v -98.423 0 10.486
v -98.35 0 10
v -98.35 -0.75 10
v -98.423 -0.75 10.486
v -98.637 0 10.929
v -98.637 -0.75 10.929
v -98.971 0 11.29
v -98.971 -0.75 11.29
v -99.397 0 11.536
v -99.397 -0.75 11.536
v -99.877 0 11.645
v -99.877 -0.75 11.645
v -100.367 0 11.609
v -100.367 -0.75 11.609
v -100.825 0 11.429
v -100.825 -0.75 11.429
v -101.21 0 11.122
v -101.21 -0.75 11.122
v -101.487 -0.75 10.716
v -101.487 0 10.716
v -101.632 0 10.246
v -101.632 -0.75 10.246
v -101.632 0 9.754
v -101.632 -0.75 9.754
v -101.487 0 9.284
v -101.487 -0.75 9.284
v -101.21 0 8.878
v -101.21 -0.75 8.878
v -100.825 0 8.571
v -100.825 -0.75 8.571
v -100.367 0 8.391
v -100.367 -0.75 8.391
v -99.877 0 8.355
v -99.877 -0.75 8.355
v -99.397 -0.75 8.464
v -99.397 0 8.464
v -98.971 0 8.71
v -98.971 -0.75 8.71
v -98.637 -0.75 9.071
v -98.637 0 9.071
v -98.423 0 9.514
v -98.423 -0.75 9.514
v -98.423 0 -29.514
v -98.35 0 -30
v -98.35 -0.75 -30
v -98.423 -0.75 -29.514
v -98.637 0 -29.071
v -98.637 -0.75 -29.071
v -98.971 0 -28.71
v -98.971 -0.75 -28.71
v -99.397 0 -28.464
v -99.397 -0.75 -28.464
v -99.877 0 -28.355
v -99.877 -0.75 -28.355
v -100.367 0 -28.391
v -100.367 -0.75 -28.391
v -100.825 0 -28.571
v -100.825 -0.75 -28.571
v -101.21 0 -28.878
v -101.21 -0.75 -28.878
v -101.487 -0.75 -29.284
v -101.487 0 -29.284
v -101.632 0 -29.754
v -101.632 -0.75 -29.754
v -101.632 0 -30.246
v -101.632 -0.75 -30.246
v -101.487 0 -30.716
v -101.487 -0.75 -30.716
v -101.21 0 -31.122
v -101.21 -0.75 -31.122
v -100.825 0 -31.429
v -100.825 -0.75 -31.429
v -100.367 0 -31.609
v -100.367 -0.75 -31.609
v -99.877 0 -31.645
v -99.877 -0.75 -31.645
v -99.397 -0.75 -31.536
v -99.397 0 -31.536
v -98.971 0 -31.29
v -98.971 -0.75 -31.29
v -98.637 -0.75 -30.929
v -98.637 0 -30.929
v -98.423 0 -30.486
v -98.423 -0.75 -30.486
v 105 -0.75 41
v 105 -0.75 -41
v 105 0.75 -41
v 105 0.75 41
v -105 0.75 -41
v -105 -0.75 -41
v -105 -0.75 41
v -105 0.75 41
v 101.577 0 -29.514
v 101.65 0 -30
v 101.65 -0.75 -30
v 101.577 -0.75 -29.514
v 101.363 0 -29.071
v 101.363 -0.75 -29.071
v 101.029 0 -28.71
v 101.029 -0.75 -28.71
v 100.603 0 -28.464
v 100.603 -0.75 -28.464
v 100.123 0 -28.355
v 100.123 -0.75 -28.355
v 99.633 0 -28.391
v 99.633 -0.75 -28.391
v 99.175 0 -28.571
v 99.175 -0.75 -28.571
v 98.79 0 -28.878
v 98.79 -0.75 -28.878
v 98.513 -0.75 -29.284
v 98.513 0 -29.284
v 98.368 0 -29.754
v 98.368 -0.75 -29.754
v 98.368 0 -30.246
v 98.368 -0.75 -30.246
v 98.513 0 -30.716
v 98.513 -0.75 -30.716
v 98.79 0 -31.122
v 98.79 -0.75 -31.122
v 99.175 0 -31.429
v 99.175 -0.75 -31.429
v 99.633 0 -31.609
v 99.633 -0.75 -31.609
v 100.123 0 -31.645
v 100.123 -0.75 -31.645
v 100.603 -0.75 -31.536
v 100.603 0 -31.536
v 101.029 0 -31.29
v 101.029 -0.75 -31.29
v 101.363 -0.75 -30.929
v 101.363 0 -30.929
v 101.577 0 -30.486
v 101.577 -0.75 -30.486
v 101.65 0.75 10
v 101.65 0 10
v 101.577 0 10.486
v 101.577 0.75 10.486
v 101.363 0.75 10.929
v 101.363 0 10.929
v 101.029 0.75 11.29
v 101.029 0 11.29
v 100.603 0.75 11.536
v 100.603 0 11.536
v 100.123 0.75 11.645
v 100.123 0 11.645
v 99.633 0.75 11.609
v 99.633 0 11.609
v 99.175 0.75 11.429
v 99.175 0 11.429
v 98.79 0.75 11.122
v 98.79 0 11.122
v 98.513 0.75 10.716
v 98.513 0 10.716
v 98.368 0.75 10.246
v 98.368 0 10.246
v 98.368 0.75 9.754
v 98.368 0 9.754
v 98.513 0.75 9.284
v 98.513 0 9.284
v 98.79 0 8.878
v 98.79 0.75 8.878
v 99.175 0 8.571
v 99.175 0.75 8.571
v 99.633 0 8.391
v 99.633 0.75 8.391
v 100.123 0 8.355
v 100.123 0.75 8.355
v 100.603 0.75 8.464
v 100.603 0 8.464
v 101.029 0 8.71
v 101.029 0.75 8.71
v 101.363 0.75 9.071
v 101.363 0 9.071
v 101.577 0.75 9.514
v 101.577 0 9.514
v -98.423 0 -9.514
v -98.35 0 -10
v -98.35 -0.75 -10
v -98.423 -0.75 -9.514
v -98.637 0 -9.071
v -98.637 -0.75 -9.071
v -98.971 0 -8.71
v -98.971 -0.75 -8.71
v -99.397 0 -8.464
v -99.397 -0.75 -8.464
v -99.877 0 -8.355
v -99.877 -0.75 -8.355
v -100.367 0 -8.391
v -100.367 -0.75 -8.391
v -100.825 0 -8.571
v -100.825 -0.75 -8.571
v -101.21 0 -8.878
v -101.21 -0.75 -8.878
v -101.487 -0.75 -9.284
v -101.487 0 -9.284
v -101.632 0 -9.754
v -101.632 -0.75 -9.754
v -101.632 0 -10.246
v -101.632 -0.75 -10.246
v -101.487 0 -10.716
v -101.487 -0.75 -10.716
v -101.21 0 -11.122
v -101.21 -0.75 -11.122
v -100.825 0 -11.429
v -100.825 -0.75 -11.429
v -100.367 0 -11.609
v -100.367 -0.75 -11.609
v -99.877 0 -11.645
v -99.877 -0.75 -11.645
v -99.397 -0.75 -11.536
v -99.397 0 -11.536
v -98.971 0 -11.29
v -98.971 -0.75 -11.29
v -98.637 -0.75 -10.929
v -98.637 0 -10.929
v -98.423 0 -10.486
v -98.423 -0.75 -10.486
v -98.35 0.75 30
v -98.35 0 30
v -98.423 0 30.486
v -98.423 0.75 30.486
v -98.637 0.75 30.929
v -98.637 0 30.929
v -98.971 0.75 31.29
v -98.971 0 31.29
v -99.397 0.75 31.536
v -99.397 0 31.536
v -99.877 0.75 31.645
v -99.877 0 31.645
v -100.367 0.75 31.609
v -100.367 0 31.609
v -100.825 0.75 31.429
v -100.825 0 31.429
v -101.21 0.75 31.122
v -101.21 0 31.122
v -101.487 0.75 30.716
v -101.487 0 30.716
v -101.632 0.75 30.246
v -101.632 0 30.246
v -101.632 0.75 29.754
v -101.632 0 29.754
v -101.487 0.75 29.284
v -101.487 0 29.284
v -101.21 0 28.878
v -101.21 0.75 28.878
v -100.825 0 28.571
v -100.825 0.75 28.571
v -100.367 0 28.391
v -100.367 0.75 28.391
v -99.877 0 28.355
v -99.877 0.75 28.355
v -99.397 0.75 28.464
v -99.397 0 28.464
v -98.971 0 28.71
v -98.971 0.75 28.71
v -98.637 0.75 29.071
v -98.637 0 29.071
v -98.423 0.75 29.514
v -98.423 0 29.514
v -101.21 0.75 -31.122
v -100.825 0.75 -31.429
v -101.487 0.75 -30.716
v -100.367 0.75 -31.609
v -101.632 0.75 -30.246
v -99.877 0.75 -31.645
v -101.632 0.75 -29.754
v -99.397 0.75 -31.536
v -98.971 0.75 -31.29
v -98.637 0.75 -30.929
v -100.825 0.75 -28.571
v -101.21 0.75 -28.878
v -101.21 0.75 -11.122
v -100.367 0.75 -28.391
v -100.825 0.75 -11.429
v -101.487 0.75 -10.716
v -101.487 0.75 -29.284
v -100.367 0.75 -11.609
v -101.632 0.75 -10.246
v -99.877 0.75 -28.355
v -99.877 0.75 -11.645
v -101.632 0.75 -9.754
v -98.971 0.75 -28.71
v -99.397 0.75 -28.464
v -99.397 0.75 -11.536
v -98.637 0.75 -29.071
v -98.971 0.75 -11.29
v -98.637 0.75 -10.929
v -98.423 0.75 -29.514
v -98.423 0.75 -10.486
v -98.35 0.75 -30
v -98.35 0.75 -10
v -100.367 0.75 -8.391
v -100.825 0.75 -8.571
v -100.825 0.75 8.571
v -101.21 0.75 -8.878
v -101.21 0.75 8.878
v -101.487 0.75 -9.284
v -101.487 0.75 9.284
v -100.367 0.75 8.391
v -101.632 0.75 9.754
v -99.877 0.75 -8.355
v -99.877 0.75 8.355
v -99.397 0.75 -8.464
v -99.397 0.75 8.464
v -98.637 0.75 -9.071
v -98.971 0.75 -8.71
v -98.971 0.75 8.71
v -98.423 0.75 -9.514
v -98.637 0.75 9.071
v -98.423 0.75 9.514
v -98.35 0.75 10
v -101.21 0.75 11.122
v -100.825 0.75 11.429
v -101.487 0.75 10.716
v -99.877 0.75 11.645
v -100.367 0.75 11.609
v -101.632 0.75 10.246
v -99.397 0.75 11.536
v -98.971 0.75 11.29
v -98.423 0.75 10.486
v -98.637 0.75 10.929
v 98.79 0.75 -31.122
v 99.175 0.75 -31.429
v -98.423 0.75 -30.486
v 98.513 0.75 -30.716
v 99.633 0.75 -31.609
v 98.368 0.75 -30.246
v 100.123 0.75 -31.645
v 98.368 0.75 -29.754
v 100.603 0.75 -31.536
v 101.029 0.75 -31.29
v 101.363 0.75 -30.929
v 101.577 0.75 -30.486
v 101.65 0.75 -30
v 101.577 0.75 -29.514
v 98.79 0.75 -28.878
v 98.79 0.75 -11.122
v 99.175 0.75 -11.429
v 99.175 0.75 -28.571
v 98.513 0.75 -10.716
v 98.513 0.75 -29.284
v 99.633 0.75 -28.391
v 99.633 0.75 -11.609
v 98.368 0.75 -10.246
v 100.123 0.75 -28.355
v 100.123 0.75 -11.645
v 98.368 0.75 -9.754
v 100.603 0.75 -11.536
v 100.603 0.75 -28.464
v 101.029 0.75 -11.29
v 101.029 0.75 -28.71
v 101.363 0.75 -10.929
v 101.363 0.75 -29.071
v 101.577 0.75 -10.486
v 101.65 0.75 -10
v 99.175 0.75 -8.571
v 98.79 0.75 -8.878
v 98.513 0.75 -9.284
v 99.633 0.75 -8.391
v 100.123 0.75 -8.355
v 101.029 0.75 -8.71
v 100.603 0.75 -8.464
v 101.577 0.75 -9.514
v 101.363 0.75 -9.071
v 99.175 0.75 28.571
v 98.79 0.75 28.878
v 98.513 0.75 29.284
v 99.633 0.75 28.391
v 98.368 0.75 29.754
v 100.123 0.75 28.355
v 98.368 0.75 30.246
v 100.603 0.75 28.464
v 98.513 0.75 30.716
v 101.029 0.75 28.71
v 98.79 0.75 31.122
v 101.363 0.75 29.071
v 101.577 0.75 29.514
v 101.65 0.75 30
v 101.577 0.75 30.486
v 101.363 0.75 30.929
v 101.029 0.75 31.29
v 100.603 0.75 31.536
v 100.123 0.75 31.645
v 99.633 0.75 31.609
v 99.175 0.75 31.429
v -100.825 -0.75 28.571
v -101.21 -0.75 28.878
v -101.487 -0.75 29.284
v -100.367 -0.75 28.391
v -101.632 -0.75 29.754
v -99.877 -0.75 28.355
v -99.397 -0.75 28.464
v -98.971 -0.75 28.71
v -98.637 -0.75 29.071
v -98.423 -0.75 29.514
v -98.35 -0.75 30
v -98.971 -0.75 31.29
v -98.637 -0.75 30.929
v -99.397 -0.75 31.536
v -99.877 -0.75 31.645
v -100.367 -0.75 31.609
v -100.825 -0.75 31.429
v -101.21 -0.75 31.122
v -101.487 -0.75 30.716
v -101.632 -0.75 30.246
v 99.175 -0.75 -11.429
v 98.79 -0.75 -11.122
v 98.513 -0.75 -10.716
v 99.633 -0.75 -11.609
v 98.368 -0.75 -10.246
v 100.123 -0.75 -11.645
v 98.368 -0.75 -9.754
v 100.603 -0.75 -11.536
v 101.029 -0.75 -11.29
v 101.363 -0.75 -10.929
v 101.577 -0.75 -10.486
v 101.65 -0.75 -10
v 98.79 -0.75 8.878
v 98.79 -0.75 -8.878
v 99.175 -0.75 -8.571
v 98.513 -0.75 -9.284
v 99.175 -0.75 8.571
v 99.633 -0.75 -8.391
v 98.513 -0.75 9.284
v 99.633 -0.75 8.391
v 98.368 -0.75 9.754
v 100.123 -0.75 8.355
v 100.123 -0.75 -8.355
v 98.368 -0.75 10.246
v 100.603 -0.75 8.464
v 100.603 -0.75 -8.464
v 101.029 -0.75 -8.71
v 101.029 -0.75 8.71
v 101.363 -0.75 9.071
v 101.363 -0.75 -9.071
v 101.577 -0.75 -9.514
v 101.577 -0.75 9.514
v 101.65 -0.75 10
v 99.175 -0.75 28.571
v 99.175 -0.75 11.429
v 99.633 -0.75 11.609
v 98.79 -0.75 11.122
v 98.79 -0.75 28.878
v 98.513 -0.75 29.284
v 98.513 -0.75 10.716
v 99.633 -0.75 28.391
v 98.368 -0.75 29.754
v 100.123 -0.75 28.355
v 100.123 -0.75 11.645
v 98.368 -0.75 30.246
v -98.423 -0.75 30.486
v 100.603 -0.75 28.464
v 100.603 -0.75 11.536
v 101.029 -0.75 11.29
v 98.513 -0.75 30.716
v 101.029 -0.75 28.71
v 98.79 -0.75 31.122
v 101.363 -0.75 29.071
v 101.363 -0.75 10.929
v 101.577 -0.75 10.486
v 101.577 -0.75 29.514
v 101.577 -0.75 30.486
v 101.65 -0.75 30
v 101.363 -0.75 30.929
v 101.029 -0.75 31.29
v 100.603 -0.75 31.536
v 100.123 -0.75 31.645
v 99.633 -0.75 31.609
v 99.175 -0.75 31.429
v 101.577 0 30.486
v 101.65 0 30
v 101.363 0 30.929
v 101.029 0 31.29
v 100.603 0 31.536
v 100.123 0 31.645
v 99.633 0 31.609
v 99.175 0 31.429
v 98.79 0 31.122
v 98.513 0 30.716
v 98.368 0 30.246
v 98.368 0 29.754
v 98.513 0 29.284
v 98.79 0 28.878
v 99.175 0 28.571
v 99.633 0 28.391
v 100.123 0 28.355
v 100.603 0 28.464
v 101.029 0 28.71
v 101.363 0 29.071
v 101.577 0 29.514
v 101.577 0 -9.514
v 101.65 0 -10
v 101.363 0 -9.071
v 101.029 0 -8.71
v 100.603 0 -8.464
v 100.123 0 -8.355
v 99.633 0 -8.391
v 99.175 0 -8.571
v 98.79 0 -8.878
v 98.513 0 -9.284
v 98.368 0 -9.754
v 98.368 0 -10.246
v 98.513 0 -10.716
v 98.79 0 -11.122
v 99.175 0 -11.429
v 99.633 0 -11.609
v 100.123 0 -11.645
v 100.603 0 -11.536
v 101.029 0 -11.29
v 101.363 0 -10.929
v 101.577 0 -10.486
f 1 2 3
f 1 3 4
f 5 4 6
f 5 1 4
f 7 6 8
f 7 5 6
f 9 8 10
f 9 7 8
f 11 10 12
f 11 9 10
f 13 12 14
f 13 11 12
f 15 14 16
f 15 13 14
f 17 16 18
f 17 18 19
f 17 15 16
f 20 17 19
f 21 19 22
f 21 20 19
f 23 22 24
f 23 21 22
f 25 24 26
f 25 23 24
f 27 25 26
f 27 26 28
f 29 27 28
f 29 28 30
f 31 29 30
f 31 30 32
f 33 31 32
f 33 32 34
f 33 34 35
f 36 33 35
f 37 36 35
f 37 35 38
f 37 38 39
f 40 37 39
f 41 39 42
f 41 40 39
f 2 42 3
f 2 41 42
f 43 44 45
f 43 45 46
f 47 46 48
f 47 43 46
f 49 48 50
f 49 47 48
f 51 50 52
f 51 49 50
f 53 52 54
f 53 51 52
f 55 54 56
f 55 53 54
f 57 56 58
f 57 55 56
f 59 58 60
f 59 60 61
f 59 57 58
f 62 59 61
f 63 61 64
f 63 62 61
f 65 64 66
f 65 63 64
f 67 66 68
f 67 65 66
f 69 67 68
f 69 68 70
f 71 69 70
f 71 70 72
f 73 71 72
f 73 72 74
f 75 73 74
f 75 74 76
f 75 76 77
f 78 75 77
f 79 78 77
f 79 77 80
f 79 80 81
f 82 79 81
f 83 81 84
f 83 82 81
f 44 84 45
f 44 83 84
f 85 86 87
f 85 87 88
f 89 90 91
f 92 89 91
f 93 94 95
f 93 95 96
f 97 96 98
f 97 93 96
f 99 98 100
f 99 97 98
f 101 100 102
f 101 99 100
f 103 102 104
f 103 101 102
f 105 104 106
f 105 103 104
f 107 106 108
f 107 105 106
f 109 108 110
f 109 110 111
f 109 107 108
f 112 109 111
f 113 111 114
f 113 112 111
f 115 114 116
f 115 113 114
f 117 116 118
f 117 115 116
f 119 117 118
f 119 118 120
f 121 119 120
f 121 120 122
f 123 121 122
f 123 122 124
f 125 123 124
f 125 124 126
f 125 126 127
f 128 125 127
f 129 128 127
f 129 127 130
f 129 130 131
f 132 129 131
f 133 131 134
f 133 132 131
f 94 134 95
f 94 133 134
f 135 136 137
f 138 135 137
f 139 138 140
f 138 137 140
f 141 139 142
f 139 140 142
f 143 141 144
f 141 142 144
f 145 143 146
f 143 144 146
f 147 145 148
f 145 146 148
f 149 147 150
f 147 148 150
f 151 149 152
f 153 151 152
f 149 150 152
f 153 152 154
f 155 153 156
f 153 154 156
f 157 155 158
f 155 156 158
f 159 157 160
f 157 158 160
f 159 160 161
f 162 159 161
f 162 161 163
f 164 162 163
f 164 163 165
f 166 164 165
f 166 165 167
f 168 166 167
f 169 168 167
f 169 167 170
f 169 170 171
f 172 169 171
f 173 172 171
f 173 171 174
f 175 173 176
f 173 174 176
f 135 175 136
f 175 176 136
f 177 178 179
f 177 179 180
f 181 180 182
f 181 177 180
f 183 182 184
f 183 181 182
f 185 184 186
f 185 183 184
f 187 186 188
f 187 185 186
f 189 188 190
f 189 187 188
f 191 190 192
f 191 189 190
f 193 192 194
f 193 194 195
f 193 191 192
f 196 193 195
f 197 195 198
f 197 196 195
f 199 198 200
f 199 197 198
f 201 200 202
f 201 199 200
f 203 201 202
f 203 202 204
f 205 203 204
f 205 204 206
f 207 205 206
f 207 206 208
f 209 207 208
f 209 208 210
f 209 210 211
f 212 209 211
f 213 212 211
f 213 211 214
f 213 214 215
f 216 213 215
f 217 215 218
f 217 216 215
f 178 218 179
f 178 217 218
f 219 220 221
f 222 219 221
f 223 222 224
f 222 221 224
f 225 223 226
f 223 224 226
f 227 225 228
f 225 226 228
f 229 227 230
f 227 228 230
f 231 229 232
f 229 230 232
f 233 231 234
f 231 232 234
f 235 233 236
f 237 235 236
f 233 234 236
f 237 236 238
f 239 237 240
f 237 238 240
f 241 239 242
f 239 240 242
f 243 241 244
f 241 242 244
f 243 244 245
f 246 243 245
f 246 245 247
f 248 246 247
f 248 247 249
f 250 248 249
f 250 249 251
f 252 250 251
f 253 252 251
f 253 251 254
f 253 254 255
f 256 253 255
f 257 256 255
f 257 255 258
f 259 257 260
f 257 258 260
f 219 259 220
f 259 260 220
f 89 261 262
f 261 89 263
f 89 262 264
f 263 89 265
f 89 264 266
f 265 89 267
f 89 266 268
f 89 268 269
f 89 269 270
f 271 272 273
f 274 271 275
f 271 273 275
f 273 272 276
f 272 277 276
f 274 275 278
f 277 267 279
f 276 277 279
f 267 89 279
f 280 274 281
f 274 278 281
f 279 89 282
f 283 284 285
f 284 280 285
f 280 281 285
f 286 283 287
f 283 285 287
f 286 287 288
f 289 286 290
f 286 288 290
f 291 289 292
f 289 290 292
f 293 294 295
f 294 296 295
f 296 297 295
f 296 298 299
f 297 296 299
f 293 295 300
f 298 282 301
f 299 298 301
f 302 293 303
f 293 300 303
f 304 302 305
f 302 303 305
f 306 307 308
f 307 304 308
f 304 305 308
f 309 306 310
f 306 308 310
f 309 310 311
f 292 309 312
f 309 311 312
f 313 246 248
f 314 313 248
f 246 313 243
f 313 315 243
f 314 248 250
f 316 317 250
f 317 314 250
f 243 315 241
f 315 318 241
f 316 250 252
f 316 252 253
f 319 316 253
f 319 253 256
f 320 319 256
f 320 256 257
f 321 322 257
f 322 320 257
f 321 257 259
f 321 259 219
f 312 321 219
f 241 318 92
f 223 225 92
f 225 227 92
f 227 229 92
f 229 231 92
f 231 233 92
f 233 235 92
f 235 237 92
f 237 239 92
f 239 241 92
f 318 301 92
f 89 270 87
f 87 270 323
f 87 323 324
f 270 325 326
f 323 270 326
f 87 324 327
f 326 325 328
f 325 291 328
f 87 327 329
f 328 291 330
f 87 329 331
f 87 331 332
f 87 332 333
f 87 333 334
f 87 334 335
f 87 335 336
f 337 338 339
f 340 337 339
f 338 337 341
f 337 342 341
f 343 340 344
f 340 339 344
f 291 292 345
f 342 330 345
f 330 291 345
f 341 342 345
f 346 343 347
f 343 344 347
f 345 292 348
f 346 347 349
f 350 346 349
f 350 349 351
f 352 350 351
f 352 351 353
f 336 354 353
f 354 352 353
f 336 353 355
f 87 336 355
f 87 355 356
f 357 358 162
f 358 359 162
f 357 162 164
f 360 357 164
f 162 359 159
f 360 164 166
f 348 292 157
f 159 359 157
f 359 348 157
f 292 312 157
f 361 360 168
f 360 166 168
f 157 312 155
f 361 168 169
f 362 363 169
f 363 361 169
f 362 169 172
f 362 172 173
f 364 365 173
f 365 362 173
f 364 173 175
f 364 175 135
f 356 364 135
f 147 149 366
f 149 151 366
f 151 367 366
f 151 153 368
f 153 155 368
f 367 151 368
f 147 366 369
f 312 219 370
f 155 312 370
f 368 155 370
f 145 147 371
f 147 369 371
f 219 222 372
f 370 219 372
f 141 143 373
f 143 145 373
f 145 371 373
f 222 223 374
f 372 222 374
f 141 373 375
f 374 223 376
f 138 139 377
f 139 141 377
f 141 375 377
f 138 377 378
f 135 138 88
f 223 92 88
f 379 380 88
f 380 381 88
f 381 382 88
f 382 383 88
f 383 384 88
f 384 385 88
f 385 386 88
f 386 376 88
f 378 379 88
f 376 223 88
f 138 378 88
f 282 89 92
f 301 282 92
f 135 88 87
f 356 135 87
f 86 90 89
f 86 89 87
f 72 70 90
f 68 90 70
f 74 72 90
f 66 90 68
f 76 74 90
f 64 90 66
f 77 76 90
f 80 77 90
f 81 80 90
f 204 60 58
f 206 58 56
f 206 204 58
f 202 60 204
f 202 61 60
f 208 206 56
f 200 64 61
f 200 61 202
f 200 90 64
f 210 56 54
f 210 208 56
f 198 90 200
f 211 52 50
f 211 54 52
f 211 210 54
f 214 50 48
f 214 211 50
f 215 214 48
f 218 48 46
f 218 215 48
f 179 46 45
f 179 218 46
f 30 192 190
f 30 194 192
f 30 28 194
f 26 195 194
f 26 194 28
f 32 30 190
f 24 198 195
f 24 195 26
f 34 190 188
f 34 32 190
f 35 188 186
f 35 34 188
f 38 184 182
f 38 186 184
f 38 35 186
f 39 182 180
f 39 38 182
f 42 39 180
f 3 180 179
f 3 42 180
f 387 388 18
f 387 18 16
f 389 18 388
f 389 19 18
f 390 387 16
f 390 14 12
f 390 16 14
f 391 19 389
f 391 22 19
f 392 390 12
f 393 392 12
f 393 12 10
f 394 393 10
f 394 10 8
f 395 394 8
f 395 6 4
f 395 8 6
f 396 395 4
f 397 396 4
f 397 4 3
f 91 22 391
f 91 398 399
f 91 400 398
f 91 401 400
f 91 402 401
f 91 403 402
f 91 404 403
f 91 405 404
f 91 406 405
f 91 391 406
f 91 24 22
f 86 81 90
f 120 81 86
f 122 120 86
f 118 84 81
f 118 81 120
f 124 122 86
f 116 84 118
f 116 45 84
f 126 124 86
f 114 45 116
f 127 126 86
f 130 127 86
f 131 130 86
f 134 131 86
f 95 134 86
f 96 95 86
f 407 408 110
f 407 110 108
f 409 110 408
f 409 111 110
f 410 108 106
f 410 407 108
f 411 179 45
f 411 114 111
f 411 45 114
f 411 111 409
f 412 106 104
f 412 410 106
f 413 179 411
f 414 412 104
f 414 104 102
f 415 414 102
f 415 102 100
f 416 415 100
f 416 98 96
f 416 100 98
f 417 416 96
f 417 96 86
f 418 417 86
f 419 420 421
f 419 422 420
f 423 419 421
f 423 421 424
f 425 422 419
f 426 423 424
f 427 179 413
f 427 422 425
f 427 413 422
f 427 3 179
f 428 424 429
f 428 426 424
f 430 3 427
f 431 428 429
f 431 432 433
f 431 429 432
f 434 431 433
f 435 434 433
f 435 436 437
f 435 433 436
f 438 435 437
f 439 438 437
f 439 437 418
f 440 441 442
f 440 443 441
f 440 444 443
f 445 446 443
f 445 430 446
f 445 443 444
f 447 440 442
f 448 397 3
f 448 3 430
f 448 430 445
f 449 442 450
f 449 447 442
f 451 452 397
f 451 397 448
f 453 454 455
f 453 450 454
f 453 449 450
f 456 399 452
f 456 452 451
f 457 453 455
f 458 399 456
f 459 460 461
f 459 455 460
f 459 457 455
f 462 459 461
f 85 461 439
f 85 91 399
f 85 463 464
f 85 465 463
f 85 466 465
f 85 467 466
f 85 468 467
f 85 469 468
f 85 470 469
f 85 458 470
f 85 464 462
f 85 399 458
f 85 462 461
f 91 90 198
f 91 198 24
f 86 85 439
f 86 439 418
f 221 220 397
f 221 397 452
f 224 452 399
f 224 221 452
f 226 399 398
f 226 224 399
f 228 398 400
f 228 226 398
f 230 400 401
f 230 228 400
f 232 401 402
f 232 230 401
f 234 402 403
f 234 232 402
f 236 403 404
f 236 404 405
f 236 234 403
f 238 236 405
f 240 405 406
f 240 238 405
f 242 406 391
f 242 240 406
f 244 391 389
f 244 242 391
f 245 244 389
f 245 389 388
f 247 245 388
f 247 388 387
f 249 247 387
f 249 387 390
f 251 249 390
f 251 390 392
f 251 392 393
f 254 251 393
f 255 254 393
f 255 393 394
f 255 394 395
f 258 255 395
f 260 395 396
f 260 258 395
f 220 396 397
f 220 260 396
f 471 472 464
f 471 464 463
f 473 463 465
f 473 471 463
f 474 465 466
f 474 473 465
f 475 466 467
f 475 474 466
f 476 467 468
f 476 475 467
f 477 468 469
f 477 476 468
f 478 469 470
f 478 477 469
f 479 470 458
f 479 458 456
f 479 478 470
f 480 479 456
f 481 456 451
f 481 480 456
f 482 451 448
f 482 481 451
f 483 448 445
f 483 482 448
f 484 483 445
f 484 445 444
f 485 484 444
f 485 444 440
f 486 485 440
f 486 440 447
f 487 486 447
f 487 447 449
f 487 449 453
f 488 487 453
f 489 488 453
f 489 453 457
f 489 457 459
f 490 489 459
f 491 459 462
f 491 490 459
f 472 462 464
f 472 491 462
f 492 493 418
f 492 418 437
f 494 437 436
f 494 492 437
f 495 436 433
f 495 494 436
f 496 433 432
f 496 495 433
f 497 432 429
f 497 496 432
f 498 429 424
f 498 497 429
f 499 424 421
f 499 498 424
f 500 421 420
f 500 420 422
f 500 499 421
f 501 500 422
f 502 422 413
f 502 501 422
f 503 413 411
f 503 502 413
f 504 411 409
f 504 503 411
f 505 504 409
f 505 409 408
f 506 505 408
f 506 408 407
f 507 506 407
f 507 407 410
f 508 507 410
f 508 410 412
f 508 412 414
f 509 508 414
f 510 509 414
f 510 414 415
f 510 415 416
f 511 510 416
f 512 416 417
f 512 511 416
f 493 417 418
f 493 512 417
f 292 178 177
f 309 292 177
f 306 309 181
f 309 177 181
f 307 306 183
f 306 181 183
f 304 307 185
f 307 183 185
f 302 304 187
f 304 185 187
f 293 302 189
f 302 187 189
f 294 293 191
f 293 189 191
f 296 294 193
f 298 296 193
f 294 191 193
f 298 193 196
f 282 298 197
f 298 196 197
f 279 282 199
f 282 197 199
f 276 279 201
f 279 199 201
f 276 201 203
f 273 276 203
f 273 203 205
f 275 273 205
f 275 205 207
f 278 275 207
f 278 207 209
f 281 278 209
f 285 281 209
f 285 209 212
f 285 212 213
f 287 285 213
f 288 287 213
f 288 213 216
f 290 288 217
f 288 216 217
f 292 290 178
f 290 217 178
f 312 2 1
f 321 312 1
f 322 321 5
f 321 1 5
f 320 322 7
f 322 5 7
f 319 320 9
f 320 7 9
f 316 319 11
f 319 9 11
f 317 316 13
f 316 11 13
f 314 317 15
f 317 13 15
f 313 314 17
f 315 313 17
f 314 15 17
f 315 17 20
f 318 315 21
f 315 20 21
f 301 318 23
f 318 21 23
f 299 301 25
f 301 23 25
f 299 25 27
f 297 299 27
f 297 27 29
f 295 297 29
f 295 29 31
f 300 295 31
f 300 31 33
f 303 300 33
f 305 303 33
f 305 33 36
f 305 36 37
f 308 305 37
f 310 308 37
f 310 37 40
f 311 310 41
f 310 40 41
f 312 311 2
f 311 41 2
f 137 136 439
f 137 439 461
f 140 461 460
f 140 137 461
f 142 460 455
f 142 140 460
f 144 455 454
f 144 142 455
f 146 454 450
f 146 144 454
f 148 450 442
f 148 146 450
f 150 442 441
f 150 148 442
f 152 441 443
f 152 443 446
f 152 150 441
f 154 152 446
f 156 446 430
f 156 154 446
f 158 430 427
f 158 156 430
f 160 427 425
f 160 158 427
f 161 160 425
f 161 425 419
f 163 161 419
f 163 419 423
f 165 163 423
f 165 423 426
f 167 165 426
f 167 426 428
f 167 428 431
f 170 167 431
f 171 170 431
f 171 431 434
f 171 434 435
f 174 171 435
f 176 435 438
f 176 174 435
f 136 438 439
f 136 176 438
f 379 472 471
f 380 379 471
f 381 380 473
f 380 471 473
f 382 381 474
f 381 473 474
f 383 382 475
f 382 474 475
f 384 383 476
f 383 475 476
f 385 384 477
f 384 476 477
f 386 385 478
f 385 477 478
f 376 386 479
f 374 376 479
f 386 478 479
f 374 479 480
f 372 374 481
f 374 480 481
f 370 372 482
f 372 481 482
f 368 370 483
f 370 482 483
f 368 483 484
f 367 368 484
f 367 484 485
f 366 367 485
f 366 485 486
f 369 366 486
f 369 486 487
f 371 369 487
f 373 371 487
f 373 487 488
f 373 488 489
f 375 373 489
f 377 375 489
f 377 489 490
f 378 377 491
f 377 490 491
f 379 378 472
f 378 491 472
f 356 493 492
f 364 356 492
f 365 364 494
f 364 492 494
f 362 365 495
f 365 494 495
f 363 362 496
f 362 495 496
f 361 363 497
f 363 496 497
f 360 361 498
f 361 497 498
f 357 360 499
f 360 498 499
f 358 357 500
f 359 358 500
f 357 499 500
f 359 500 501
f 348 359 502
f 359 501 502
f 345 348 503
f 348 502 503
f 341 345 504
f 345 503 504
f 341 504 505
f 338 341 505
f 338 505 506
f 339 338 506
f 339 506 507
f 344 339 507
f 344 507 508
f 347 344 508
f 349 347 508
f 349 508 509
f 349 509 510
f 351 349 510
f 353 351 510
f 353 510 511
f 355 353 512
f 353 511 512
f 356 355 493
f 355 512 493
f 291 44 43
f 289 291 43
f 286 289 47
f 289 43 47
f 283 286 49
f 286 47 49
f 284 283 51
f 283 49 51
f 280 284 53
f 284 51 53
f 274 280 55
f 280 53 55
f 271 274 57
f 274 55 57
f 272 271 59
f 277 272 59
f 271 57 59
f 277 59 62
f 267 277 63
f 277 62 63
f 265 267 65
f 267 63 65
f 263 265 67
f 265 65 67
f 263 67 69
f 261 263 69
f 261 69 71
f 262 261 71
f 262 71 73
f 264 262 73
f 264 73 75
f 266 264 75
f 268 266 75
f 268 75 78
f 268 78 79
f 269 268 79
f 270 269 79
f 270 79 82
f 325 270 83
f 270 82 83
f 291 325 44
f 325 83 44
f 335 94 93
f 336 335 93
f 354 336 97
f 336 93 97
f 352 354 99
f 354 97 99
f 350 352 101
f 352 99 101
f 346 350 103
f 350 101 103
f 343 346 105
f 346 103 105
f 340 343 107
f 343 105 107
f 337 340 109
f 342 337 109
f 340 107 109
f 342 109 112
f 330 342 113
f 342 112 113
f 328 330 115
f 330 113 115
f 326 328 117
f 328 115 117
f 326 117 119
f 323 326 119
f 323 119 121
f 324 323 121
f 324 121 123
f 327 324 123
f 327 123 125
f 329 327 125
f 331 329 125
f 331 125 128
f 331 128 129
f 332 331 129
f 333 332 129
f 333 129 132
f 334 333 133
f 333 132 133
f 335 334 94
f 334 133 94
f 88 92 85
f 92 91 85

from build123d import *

# Parameters (mm, degrees)
SKETCH_W       = 210
SKETCH_H       = 82
SKETCH_R       = 1.65
PAD_DEPTH      = 0.75
PAD_DEPTH_BACK = 0.75


with BuildPart() as part:
    # Sketch → Pad (new body, two sides)
    with BuildSketch(Plane.XZ) as pad_sk:
        Rectangle(SKETCH_W, SKETCH_H)
        with Locations((100, 30)):
            Circle(SKETCH_R, mode=Mode.SUBTRACT)
        with Locations((100, 10)):
            Circle(SKETCH_R, mode=Mode.SUBTRACT)
        with Locations((100, -30)):
            Circle(SKETCH_R, mode=Mode.SUBTRACT)
        with Locations((100, -10)):
            Circle(SKETCH_R, mode=Mode.SUBTRACT)
        with Locations((-100, 30)):
            Circle(SKETCH_R, mode=Mode.SUBTRACT)
        with Locations((-100, 10)):
            Circle(SKETCH_R, mode=Mode.SUBTRACT)
        with Locations((-100, -30)):
            Circle(SKETCH_R, mode=Mode.SUBTRACT)
        with Locations((-100, -10)):
            Circle(SKETCH_R, mode=Mode.SUBTRACT)
    extrude(amount=PAD_DEPTH)
    extrude(pad_sk.sketch, amount=-PAD_DEPTH_BACK)


solid = part.part
